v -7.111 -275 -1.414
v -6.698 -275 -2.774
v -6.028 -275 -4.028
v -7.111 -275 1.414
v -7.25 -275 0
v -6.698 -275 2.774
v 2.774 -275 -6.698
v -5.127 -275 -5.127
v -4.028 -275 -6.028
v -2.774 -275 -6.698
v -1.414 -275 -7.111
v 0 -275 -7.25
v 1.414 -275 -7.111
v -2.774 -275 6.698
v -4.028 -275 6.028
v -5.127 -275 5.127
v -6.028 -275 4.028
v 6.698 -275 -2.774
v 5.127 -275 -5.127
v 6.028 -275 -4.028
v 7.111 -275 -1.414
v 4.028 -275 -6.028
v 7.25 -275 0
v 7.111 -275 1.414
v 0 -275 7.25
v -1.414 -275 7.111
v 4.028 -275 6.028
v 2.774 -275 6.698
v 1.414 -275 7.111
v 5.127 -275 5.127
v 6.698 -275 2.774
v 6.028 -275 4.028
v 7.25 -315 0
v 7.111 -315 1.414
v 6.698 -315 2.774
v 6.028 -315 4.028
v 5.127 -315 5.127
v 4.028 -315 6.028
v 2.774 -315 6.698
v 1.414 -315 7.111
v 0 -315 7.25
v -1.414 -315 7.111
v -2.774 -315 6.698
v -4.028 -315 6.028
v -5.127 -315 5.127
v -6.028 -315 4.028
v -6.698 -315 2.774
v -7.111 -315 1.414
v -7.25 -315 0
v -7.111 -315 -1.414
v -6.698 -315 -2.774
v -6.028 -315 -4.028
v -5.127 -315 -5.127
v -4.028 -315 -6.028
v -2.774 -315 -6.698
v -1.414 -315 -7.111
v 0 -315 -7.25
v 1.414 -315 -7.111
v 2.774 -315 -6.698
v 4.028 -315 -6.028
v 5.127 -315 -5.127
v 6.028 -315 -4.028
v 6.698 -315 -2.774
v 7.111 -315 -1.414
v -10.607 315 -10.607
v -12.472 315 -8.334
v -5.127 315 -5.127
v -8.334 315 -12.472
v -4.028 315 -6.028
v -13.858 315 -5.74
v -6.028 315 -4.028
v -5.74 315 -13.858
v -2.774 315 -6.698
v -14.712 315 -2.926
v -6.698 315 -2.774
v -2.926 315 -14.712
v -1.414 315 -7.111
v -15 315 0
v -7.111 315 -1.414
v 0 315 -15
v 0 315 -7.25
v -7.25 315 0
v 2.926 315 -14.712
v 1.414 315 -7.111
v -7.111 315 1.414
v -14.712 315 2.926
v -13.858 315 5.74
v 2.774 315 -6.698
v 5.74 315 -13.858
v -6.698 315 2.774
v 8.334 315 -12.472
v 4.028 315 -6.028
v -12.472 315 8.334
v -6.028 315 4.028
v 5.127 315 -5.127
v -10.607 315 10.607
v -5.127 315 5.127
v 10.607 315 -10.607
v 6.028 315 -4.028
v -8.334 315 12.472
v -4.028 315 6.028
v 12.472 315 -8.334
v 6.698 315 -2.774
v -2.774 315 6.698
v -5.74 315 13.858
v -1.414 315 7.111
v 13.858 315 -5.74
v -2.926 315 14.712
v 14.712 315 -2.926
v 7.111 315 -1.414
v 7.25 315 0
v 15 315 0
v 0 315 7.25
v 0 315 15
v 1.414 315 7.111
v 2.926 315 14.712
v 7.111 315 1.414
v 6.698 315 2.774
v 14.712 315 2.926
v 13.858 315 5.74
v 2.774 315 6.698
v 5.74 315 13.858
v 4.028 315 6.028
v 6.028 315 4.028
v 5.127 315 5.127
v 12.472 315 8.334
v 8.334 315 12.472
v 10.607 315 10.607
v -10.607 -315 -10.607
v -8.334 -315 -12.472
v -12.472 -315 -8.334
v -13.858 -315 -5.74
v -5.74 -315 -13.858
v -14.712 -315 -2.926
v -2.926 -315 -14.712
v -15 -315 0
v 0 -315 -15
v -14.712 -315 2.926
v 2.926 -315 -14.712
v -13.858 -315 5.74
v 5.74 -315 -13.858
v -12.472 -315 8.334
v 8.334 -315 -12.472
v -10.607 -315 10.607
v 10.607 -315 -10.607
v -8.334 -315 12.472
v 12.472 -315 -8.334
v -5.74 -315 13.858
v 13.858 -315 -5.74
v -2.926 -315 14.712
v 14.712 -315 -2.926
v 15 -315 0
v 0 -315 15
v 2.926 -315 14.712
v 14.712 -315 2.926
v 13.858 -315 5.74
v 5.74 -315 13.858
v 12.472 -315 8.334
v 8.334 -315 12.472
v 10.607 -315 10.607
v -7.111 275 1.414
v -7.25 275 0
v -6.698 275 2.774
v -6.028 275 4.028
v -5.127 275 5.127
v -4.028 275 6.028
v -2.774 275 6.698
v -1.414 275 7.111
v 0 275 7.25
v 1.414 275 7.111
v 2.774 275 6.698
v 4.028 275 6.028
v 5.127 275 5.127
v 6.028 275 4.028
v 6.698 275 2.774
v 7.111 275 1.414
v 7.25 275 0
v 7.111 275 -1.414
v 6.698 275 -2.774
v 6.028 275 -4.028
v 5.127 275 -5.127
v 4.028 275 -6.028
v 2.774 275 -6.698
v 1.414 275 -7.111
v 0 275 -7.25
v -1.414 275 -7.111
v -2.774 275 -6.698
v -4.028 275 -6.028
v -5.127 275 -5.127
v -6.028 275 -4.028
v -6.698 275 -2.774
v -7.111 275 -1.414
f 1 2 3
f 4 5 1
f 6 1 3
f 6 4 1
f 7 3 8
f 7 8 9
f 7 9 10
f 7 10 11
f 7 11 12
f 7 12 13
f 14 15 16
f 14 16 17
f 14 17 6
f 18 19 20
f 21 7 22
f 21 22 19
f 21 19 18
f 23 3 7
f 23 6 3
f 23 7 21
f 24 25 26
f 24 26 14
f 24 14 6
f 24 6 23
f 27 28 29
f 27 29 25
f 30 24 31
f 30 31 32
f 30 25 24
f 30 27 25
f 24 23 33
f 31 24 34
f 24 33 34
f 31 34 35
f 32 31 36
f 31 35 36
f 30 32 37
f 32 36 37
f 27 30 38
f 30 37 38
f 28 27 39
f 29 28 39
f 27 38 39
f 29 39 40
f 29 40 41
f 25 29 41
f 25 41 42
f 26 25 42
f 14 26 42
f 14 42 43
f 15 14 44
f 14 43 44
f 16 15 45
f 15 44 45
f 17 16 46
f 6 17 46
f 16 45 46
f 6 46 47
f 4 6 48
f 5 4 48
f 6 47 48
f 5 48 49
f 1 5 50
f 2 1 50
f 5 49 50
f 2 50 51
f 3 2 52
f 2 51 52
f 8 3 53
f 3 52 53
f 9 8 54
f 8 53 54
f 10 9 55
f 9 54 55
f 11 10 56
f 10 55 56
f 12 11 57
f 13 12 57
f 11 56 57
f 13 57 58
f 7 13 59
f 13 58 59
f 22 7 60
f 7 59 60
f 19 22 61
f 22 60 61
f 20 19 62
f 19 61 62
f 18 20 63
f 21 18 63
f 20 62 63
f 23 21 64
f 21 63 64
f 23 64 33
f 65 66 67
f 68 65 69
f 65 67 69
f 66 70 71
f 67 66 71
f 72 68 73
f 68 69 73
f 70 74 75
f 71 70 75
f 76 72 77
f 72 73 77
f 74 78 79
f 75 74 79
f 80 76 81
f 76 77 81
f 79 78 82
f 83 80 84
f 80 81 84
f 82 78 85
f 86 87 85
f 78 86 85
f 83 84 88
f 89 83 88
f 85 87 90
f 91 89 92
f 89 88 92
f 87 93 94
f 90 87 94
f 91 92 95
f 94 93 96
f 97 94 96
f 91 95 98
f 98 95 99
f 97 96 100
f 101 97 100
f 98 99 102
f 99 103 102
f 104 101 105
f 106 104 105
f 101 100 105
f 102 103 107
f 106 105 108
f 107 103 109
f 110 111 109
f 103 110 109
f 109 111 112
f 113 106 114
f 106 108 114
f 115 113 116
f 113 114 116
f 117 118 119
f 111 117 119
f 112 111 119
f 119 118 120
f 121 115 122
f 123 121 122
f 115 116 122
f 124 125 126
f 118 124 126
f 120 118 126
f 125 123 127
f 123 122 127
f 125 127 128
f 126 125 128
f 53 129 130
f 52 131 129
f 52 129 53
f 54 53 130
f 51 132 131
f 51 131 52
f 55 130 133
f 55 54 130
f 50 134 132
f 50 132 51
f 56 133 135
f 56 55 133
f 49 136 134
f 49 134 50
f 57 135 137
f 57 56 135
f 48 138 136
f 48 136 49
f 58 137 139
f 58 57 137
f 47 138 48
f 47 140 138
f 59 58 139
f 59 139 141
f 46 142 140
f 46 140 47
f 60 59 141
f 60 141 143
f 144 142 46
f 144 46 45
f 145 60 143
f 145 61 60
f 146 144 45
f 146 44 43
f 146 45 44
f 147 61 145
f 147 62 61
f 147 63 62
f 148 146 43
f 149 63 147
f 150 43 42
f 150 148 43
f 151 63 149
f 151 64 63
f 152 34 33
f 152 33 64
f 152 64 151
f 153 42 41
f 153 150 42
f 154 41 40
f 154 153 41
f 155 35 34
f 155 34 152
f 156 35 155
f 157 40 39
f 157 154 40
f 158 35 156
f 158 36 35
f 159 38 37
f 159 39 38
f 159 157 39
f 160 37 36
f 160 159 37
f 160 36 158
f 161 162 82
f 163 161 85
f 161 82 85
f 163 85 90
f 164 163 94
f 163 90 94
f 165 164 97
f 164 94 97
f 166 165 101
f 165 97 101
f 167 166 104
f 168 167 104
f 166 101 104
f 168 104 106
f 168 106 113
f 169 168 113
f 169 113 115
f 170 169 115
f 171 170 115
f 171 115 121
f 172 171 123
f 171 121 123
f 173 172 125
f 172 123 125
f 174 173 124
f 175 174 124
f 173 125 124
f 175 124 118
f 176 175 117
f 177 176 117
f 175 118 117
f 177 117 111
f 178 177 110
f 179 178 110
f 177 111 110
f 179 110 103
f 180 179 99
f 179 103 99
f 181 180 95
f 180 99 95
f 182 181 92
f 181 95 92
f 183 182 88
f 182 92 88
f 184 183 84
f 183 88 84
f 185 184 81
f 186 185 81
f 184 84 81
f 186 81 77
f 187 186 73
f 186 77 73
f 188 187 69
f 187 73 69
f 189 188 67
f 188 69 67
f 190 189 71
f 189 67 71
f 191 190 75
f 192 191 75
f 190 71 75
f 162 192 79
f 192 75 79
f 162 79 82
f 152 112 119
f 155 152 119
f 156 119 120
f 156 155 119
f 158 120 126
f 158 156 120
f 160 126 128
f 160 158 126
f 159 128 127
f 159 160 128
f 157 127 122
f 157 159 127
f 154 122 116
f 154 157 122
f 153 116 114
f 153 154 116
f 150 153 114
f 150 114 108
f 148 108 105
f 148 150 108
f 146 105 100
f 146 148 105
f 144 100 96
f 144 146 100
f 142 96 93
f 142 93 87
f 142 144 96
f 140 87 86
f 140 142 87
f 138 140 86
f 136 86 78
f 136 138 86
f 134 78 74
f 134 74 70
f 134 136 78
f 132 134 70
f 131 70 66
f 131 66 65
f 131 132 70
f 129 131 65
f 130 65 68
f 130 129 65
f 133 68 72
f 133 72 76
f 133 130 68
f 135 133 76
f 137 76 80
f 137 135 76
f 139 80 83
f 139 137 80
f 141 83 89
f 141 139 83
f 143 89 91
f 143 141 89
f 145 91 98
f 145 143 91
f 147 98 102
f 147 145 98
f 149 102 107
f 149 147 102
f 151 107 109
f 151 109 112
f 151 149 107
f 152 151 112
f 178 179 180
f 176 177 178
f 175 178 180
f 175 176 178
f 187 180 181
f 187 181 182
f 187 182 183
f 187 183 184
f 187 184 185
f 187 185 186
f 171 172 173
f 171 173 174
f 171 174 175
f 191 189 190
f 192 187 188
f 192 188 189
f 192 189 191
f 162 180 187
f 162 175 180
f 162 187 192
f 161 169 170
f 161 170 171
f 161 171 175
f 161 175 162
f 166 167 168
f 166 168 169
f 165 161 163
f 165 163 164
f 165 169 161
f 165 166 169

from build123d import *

# Parameters (mm, degrees)
F0_R     = 15
F1_DEPTH = 315
F2_R     = 7.25
F3_DEPTH = 40
F4_R     = 7.25
F5_DEPTH = 40


with BuildPart() as f1:
    # F0 (on Front) → F1 (new body, symmetric)
    with BuildSketch(Plane.XZ):
        Circle(F0_R)
    extrude(amount=F1_DEPTH, both=True)

    # F2 (on face) → F3 (cut)
    with BuildSketch(Plane.XZ.offset(315)):
        Circle(F2_R)
    extrude(amount=-F3_DEPTH, mode=Mode.SUBTRACT)

    # F4 (on face) → F5 (cut)
    with BuildSketch(Plane(origin=(0, 315, 0), x_dir=(-1, 0, 0), z_dir=(0, 1, 0))):
        Circle(F4_R)
    extrude(amount=-F5_DEPTH, mode=Mode.SUBTRACT)


solid = f1.part
